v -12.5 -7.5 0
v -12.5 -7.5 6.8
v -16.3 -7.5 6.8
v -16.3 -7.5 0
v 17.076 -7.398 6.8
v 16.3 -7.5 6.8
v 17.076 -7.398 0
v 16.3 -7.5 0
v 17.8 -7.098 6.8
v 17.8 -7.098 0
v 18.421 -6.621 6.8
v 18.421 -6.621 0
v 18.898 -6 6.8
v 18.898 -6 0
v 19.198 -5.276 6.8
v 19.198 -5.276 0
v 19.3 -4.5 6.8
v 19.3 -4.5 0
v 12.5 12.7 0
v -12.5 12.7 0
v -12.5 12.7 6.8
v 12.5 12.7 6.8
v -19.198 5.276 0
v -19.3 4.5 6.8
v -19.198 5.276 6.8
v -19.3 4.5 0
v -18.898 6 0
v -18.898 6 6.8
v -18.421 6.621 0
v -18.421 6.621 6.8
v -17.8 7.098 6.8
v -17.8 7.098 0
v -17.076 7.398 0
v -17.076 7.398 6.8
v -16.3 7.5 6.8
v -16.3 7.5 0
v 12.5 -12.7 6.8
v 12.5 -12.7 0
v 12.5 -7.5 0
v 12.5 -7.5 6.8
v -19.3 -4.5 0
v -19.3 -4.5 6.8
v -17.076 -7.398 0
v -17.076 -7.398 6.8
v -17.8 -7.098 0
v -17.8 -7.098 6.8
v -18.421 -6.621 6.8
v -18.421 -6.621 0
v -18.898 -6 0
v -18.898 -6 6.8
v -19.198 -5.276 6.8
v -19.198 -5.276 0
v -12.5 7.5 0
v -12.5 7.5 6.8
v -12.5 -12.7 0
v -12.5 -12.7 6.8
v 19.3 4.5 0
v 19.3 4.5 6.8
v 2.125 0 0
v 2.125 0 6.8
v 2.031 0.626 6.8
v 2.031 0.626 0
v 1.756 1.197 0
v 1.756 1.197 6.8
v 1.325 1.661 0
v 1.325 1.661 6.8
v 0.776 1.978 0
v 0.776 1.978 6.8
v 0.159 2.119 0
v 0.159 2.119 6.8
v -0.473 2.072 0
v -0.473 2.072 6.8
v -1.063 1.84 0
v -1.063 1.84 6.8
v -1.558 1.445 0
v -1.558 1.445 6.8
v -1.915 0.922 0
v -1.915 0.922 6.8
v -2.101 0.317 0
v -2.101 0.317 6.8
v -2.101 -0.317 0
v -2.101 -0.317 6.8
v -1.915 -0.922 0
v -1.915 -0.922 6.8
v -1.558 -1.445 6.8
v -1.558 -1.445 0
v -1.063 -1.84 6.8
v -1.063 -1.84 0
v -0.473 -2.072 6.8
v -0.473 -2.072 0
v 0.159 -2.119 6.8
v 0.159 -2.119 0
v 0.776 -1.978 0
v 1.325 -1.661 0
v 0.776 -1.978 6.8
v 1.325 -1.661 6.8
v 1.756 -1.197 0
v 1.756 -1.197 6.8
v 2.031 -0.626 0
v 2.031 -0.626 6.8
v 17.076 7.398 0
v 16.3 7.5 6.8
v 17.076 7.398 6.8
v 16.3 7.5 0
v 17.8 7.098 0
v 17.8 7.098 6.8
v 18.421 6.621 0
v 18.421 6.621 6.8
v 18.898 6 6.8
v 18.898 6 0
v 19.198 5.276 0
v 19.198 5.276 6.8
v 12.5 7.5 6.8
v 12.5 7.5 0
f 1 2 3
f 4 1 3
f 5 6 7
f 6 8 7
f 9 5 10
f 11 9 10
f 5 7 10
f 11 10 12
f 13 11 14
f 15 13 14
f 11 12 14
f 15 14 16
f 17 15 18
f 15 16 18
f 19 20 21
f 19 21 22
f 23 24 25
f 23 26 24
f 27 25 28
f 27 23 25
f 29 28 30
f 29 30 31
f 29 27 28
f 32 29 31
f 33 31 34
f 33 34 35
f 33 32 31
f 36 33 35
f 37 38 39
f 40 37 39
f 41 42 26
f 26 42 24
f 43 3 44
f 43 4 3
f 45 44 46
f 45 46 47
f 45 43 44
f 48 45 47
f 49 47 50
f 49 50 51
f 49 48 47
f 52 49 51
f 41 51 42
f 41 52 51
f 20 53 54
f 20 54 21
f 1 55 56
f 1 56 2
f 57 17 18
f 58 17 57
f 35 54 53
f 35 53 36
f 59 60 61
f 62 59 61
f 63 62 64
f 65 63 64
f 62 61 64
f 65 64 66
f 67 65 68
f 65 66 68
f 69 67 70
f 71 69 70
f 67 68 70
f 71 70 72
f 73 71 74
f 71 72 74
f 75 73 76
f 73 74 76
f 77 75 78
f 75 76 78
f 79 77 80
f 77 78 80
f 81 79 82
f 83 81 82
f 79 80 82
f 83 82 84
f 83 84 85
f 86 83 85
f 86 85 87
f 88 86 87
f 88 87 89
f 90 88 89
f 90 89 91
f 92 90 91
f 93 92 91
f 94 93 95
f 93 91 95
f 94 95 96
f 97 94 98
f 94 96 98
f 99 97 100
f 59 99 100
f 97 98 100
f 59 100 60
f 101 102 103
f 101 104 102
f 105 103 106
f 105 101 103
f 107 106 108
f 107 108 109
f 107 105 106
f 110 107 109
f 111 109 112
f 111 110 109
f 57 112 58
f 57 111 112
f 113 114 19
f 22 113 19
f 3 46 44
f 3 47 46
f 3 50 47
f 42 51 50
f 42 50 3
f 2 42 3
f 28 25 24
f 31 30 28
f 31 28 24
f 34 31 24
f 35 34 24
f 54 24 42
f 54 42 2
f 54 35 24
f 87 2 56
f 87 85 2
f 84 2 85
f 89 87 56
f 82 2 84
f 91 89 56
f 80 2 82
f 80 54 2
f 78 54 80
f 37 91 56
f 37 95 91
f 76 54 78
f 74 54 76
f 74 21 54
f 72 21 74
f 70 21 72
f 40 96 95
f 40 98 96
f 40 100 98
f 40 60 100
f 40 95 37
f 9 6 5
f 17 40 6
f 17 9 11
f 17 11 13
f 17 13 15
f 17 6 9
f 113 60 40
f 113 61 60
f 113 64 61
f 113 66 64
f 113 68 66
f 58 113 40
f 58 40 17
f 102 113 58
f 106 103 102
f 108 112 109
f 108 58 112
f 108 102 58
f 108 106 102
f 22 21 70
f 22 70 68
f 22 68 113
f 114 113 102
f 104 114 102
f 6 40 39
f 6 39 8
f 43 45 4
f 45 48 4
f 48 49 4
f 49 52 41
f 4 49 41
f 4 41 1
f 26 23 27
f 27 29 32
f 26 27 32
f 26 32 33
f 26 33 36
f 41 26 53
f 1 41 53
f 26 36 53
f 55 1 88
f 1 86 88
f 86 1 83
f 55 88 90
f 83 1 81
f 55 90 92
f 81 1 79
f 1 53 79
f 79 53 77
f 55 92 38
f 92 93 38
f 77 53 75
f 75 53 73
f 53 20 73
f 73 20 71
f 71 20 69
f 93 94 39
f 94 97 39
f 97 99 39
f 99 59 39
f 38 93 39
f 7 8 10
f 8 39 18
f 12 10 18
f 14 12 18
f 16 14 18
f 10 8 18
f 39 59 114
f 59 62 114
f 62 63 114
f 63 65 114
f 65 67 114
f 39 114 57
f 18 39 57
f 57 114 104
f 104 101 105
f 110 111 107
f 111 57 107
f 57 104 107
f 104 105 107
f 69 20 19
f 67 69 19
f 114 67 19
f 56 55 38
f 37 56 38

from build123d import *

# Parameters (mm, degrees)
SKETCH1_W            = 25
SKETCH1_H            = 25.4
BOSS_EXTRUDE1_DEPTH  = 6.8
SKETCH2_W            = 6.8
SKETCH2_H            = 15
BOSS_EXTRUDE2_DEPTH  = 6.8
FILLET1_R            = 3
FILLET1_OF_MIRROR1_R = 3
SKETCH3_R            = 2.125
CUT_EXTRUDE1_DEPTH   = 6.8


with BuildPart() as part:
    # Sketch1 → Boss-Extrude1 (new body)
    with BuildSketch(Plane.XY):
        Rectangle(SKETCH1_W, SKETCH1_H)
    extrude(amount=BOSS_EXTRUDE1_DEPTH)

    # Sketch2 → Boss-Extrude2 (add)
    with BuildSketch(Plane.XY.offset(6.8)):
        with Locations((15.9, 0)):
            Rectangle(SKETCH2_W, SKETCH2_H)
    boss_extrude2 = extrude(amount=-BOSS_EXTRUDE2_DEPTH)

    # Fillet1
    fillet1_edges = [part.edges().sort_by_distance(p)[0] for p in [
        (19.3, 7.5, 3.4),
        (19.3, -7.5, 3.4),
    ]]
    fillet(fillet1_edges, radius=FILLET1_R)

    # Mirror1: Boss-Extrude2 across plane
    add(boss_extrude2.mirror(Plane(origin=(0, 0, 0), x_dir=(0, 0, 1), z_dir=(1, 0, 0))))

    # Fillet1 of Mirror1
    fillet1_of_mirror1_edges = [part.edges().sort_by_distance(p)[0] for p in [
        (-19.3, 7.5, 3.4),
        (-19.3, -7.5, 3.4),
    ]]
    fillet(fillet1_of_mirror1_edges, radius=FILLET1_OF_MIRROR1_R)

    # Sketch3 → Cut-Extrude1 (cut)
    with BuildSketch(Plane.XY.offset(6.8)):
        Circle(SKETCH3_R)
    extrude(amount=-CUT_EXTRUDE1_DEPTH, mode=Mode.SUBTRACT)


solid = part.part
